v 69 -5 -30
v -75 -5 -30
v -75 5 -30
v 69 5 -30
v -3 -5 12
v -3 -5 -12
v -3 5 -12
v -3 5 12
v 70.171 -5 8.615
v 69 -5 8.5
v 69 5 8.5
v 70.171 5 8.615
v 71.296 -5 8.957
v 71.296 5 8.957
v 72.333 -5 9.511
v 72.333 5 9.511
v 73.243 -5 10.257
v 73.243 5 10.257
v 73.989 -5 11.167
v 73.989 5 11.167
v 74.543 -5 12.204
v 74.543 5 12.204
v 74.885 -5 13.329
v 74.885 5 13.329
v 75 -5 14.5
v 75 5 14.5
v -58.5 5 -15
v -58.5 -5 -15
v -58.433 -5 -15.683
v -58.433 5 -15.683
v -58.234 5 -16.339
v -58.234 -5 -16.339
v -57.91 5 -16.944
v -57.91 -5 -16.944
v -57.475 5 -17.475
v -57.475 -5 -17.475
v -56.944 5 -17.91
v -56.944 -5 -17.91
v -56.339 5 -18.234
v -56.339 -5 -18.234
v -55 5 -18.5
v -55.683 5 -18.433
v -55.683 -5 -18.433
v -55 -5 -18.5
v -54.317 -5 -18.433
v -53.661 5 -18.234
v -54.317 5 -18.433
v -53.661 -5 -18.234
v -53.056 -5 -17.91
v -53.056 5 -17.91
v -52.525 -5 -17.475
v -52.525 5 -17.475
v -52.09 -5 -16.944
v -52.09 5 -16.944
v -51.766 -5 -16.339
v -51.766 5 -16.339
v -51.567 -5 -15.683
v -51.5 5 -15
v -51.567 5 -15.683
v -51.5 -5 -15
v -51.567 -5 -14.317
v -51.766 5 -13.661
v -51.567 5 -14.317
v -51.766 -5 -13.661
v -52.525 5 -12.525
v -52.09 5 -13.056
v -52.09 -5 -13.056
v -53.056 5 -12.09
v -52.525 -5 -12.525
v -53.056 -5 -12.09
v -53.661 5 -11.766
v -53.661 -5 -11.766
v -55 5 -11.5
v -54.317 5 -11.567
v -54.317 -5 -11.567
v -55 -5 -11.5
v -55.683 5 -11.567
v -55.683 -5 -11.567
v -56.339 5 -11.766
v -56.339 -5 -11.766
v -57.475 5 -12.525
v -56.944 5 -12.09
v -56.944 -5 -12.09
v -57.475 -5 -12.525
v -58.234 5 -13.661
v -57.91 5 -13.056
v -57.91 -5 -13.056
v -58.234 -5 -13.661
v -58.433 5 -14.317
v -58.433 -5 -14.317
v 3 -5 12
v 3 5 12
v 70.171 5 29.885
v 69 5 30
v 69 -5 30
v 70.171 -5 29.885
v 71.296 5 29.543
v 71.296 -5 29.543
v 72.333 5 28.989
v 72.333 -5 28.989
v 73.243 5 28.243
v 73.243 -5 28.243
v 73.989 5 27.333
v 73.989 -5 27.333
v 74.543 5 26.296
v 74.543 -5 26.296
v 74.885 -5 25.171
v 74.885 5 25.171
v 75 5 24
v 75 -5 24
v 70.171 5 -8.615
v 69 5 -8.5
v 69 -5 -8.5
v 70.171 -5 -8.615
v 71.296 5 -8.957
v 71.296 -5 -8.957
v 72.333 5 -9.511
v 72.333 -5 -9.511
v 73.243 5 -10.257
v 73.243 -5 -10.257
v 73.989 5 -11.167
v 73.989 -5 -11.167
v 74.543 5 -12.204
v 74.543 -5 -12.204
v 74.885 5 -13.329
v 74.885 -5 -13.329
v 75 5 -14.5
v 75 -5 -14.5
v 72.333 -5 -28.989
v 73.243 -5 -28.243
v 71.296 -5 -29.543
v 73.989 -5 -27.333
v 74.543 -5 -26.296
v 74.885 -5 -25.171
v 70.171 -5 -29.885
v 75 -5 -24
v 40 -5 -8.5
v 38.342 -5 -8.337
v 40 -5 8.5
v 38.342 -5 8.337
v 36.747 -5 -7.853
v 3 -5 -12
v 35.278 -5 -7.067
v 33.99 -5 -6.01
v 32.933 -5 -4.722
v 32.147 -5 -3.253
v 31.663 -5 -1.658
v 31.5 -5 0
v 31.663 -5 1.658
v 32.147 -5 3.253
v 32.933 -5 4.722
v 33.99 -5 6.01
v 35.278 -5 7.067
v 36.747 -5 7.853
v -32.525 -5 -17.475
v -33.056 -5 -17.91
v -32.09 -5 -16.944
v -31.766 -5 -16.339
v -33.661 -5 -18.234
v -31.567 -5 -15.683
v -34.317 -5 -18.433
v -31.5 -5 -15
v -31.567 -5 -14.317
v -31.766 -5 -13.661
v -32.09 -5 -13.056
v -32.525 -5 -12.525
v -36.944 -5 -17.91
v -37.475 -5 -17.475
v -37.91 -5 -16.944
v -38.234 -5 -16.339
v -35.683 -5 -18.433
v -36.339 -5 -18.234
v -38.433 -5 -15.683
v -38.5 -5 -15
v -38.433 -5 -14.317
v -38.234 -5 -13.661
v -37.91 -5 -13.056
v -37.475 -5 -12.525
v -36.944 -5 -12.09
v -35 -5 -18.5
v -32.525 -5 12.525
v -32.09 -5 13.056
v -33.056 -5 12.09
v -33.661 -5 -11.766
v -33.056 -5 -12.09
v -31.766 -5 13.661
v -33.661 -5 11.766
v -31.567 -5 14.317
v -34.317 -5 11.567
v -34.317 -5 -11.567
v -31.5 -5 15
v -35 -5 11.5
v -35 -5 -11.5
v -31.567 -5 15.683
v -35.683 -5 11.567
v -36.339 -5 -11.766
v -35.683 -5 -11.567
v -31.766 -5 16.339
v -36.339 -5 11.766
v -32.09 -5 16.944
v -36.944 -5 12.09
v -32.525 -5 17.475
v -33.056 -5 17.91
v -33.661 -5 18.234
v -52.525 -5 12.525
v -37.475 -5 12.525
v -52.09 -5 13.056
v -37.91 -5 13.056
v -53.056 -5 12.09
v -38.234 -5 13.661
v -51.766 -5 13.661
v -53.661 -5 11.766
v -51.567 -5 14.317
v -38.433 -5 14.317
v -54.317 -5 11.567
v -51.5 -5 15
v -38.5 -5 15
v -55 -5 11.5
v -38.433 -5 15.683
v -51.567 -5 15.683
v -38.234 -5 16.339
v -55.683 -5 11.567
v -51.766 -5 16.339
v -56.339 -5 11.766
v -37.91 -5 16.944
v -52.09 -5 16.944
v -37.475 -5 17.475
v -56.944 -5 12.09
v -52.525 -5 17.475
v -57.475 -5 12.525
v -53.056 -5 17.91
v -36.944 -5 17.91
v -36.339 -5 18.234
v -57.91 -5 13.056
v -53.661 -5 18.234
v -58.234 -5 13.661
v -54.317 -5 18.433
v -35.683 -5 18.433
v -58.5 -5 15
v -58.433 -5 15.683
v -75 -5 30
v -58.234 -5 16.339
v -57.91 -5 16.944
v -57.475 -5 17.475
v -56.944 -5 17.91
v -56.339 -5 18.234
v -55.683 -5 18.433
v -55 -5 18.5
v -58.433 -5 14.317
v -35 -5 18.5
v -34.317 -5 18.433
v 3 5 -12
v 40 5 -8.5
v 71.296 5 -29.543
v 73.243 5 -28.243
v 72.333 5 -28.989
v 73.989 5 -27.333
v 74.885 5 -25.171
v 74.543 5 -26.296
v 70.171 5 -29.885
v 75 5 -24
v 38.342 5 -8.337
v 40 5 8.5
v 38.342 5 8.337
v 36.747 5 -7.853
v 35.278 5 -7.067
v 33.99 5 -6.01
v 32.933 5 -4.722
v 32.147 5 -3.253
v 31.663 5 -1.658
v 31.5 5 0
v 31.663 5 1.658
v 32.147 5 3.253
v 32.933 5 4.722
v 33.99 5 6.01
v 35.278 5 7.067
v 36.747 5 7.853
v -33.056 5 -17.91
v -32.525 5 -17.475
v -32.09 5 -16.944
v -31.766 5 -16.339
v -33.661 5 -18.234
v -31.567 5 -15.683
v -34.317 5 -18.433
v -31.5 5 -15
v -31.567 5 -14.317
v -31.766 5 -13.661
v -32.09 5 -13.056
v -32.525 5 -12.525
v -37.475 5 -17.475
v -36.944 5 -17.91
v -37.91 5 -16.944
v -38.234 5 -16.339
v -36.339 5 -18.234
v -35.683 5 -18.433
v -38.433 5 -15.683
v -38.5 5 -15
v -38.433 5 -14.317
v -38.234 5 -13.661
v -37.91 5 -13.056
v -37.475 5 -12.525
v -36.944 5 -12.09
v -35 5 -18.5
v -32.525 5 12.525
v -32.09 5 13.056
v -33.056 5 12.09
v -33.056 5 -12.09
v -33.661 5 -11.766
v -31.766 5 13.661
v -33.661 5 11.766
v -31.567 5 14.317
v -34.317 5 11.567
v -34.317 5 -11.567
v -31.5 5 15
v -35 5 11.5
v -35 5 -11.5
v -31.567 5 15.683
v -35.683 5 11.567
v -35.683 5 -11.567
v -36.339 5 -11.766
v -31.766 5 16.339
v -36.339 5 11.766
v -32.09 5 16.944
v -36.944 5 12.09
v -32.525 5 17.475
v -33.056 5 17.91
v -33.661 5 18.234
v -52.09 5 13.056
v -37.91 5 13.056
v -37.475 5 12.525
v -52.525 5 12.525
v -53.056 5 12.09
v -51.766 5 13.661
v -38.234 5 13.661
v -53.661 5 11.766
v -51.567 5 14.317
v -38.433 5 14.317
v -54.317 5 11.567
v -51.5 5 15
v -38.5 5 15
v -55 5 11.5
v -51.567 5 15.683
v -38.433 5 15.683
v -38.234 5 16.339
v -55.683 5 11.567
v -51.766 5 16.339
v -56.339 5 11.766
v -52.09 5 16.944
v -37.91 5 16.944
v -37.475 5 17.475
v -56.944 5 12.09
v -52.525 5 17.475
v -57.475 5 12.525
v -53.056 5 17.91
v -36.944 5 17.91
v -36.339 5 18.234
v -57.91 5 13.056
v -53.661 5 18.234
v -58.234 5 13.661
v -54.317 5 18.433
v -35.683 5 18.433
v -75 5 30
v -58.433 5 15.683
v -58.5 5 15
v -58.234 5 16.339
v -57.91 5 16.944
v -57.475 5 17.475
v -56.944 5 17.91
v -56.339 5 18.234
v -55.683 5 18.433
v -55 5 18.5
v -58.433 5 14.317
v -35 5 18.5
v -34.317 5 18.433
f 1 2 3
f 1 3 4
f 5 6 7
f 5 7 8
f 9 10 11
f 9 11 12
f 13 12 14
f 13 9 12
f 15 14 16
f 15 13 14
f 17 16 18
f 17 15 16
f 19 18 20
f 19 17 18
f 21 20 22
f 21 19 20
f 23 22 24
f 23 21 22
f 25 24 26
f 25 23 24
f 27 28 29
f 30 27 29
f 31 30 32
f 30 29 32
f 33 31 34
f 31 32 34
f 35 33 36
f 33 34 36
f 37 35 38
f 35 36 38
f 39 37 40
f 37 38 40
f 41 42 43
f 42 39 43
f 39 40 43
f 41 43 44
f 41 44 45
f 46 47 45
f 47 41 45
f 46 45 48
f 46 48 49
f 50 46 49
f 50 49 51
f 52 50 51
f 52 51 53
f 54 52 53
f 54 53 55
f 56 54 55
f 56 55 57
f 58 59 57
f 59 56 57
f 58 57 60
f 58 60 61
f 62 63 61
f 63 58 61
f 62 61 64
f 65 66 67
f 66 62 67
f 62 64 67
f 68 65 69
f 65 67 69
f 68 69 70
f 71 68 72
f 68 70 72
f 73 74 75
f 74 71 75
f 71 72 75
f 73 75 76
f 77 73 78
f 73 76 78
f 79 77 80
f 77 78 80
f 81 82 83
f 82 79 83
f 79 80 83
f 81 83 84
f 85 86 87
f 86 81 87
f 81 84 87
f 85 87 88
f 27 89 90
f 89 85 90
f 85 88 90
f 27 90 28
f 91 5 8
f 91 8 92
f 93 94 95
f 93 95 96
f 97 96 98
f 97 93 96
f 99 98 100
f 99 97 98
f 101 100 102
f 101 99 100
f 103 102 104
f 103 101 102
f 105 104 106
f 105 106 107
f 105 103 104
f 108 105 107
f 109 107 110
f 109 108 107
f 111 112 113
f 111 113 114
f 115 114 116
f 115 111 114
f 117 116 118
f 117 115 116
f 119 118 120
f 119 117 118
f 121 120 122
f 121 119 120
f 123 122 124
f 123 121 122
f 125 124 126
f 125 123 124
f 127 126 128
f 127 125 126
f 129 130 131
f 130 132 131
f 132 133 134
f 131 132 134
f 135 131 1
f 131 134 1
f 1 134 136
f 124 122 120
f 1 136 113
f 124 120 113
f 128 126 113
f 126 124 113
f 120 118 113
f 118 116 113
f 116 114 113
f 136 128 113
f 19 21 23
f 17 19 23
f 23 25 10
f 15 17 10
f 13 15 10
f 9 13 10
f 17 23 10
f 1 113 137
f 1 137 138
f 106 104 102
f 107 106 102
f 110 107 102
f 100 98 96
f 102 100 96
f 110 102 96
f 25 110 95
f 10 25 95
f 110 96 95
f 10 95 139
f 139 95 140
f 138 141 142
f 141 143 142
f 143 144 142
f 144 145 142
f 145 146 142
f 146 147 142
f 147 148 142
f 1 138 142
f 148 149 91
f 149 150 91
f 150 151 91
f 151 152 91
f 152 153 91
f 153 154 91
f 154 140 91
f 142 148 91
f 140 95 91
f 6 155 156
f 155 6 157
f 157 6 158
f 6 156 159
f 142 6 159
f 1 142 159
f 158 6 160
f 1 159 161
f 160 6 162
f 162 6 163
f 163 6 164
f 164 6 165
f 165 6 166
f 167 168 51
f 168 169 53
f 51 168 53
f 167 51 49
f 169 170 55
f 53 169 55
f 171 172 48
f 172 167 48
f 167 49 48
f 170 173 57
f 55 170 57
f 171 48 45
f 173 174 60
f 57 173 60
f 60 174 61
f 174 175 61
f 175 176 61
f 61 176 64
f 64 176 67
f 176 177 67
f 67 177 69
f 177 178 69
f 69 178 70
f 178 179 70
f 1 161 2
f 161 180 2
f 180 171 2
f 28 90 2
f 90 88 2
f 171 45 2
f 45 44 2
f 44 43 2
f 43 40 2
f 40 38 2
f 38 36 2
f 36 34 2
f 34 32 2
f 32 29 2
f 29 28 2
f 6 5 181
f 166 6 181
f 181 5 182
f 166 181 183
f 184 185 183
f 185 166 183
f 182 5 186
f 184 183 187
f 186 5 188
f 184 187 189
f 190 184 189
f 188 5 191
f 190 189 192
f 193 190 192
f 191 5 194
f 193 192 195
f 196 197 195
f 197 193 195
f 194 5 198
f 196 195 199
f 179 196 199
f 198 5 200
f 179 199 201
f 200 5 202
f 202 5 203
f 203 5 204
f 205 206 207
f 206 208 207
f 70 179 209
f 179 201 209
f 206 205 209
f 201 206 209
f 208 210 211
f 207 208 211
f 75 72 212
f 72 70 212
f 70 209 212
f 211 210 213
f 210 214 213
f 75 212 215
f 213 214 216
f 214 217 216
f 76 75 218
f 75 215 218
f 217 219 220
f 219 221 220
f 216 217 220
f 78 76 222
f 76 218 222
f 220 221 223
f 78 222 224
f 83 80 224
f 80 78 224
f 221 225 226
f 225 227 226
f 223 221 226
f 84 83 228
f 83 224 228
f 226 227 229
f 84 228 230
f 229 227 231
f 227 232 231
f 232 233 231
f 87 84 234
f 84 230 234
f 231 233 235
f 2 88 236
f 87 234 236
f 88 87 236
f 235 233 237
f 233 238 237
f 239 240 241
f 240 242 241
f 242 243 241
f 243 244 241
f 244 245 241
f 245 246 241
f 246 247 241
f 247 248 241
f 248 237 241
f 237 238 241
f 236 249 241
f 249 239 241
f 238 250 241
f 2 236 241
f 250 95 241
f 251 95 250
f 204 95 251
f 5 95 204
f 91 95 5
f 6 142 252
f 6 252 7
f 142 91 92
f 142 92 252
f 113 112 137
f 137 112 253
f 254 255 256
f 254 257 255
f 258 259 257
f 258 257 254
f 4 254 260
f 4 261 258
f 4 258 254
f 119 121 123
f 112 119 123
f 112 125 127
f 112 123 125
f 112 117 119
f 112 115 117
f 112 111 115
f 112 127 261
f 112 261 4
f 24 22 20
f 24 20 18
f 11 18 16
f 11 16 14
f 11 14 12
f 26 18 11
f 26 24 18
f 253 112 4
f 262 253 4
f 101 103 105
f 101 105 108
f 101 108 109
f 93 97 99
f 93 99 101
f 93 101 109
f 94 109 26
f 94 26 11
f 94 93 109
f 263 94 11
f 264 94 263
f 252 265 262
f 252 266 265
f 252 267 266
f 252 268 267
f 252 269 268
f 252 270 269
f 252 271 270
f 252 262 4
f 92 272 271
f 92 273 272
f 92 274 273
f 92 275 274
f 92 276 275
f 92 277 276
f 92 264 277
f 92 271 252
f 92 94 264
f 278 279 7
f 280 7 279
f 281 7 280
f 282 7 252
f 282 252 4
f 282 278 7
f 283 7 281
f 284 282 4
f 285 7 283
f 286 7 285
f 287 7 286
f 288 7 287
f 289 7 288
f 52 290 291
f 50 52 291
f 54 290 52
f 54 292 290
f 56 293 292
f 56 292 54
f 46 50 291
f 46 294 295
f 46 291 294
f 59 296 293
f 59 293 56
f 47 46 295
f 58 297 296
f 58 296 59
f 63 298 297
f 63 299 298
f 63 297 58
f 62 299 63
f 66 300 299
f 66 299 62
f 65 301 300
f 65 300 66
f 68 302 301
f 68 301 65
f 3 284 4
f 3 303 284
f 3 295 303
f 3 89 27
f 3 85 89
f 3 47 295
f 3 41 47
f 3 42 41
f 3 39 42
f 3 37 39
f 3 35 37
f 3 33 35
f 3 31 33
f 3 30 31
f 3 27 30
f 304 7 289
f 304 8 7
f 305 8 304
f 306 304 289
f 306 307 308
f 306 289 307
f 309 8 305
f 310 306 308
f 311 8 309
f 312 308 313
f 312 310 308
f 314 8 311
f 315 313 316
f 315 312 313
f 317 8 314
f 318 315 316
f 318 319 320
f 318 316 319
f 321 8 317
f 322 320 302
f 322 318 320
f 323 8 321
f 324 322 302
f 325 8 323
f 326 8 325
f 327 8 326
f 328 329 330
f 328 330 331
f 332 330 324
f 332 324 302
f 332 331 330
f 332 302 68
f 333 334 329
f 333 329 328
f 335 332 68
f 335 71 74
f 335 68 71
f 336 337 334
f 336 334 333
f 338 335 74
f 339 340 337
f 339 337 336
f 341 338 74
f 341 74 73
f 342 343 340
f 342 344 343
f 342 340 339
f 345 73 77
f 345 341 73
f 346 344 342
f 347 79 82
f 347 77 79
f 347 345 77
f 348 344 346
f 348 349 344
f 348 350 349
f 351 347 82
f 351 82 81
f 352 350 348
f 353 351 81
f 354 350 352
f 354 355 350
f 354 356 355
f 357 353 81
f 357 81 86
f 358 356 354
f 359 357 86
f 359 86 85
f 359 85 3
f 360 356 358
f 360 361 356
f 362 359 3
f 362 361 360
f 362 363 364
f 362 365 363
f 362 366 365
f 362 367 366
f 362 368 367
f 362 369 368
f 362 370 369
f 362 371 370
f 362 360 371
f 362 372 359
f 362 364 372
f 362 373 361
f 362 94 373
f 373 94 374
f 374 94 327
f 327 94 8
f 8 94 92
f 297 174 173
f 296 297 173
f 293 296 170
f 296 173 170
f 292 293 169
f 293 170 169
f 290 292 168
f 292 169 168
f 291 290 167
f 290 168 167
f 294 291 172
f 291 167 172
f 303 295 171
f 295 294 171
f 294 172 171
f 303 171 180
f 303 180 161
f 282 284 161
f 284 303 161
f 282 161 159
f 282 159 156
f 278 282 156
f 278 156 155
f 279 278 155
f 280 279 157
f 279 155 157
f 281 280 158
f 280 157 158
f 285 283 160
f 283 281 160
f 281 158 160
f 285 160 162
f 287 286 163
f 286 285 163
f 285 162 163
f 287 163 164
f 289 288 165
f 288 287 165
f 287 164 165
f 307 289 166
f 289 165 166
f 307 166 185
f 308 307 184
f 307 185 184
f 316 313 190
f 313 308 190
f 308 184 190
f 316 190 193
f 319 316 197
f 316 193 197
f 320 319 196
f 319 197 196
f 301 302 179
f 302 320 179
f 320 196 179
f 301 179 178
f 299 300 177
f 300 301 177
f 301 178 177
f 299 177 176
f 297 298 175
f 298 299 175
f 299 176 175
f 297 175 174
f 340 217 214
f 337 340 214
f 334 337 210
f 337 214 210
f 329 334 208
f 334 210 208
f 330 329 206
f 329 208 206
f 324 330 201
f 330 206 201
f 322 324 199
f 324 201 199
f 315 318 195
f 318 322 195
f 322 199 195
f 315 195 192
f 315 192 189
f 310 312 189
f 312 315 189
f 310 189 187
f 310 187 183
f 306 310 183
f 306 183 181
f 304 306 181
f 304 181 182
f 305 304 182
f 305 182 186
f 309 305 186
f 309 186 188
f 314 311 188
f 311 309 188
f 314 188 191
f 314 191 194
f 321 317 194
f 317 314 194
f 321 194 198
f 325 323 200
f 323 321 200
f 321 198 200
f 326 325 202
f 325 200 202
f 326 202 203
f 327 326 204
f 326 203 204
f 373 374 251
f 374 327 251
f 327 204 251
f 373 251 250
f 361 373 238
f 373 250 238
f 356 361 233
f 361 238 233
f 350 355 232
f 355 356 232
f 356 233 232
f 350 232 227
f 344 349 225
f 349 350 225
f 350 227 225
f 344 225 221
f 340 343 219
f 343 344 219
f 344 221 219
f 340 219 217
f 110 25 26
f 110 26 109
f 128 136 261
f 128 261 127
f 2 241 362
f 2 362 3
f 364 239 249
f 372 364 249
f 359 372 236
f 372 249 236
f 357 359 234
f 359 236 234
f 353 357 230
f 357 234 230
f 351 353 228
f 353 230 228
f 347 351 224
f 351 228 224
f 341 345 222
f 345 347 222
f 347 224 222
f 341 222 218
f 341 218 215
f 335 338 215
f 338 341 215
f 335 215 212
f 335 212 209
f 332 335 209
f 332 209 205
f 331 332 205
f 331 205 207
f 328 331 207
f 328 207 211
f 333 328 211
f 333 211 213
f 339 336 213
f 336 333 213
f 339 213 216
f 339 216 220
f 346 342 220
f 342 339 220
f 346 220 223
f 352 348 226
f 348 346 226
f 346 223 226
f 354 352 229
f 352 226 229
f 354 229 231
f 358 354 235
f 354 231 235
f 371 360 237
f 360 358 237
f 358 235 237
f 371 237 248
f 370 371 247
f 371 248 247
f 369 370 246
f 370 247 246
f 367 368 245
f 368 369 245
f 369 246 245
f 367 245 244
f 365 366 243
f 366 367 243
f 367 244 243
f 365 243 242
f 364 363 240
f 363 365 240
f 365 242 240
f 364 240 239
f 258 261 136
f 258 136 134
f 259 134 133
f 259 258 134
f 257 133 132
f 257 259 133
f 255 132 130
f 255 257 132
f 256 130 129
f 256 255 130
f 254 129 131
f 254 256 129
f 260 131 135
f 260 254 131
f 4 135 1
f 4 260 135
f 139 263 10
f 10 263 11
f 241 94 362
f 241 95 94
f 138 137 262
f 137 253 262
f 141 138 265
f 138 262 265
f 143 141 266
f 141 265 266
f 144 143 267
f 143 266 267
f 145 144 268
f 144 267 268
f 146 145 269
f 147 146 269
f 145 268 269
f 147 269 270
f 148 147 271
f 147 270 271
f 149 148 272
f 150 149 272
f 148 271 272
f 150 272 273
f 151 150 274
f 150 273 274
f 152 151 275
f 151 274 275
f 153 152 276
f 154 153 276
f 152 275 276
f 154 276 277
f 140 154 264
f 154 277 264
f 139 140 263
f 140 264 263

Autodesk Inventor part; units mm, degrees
ref_plane "YZ Plane" through (0, 0, 0) normal (1, 0, 0) x (0, 1, 0)
ref_plane "XZ Plane" through (0, 0, 0) normal (0, 1, 0) x (-1, 0, 0)
ref_plane "XY Plane" through (0, 0, 0) normal (0, 0, 1) x (1, 0, 0)
sketch "Sketch1" plane through (0, 0, 0) normal (0, 1, 0) x (-1, 0, 0)
  line L0 (-75, 30) -> (75, 30)
  line L1 (75, 30) -> (75, -30)
  line L2 (75, -30) -> (-75, -30)
  line L3 (-75, -30) -> (-75, 30)
  line L4 (-75, 30) -> (75, -30) construction
  line L5 (75, 30) -> (-75, -30) construction
  line L6 (-80, 0) -> (-40, 0) construction
  line L7 (-80, -8.5) -> (-40, -8.5)
  line L8 (-40, 8.5) -> (-80, 8.5)
  arc A0 (-80, 8.5) -> (-80, -8.5) centre (-80, 0) ccw
  arc A1 (-40, -8.5) -> (-40, 8.5) centre (-40, 0) ccw
  circle A2 centre (55, 15) radius 3.5
  circle A3 centre (55, -15) radius 3.5
  circle A4 centre (35, 15) radius 3.5
  circle A5 centre (35, -15) radius 3.5
  point P0 (0, 0)
  point P1 (-60, 0)
  dimension "d0" = 60
  dimension "d1" = 150
  dimension "d2" = 60
  dimension "d3" = 40
  dimension "d4" = 17
  dimension "d5" = 7
  dimension "d6" = 15
  dimension "d7" = 30
  dimension "d8" = 20
  dimension "d9" = 20
extrude "Plate1" add sketch "Sketch1" along normal mid plane 10 contours L0 L1 L2 L3 L7 A1 L8 | L8 A1 L7 L3
extrude "Cut1" cut sketch "Sketch1" against normal mid plane 10 contours L8 A1 L7 L3 | L3 L7 A0 L8
sketch "Sketch2" plane through (0, -5, 0) normal (0, -1, 0) x (1, 0, 0)
  line L0 (-3, 12) -> (3, 12)
  line L1 (3, 12) -> (3, -12)
  line L2 (3, -12) -> (-3, -12)
  line L3 (-3, -12) -> (-3, 12)
  line L4 (75, 30) -> (-75, 30) projected
  point P0 (0, 0)
  point P1 (0, 12)
  dimension "d13" = 24
  dimension "d14" = 18
  dimension "d15" = 6
extrude "Cut2" cut sketch "Sketch2" against normal blind 10
fillet "Corner Round1" radius 6 4 edges at (75, 0, 30) (75, 0, 8.5) (75, 0, -8.5) (75, 0, -30)
equation "\"d11\" = Thickness"
equation "\"d16\" = Thickness"
equation "\"d10\" = Thickness"
equation "\"BendReliefDepth\" = 0.5 * Thickness"
equation "\"Thickness\" = 10"
properties part number "HCMUTE-CDT23-BAT_TRUC_CANG_TAI" material "Stainless Steel"
